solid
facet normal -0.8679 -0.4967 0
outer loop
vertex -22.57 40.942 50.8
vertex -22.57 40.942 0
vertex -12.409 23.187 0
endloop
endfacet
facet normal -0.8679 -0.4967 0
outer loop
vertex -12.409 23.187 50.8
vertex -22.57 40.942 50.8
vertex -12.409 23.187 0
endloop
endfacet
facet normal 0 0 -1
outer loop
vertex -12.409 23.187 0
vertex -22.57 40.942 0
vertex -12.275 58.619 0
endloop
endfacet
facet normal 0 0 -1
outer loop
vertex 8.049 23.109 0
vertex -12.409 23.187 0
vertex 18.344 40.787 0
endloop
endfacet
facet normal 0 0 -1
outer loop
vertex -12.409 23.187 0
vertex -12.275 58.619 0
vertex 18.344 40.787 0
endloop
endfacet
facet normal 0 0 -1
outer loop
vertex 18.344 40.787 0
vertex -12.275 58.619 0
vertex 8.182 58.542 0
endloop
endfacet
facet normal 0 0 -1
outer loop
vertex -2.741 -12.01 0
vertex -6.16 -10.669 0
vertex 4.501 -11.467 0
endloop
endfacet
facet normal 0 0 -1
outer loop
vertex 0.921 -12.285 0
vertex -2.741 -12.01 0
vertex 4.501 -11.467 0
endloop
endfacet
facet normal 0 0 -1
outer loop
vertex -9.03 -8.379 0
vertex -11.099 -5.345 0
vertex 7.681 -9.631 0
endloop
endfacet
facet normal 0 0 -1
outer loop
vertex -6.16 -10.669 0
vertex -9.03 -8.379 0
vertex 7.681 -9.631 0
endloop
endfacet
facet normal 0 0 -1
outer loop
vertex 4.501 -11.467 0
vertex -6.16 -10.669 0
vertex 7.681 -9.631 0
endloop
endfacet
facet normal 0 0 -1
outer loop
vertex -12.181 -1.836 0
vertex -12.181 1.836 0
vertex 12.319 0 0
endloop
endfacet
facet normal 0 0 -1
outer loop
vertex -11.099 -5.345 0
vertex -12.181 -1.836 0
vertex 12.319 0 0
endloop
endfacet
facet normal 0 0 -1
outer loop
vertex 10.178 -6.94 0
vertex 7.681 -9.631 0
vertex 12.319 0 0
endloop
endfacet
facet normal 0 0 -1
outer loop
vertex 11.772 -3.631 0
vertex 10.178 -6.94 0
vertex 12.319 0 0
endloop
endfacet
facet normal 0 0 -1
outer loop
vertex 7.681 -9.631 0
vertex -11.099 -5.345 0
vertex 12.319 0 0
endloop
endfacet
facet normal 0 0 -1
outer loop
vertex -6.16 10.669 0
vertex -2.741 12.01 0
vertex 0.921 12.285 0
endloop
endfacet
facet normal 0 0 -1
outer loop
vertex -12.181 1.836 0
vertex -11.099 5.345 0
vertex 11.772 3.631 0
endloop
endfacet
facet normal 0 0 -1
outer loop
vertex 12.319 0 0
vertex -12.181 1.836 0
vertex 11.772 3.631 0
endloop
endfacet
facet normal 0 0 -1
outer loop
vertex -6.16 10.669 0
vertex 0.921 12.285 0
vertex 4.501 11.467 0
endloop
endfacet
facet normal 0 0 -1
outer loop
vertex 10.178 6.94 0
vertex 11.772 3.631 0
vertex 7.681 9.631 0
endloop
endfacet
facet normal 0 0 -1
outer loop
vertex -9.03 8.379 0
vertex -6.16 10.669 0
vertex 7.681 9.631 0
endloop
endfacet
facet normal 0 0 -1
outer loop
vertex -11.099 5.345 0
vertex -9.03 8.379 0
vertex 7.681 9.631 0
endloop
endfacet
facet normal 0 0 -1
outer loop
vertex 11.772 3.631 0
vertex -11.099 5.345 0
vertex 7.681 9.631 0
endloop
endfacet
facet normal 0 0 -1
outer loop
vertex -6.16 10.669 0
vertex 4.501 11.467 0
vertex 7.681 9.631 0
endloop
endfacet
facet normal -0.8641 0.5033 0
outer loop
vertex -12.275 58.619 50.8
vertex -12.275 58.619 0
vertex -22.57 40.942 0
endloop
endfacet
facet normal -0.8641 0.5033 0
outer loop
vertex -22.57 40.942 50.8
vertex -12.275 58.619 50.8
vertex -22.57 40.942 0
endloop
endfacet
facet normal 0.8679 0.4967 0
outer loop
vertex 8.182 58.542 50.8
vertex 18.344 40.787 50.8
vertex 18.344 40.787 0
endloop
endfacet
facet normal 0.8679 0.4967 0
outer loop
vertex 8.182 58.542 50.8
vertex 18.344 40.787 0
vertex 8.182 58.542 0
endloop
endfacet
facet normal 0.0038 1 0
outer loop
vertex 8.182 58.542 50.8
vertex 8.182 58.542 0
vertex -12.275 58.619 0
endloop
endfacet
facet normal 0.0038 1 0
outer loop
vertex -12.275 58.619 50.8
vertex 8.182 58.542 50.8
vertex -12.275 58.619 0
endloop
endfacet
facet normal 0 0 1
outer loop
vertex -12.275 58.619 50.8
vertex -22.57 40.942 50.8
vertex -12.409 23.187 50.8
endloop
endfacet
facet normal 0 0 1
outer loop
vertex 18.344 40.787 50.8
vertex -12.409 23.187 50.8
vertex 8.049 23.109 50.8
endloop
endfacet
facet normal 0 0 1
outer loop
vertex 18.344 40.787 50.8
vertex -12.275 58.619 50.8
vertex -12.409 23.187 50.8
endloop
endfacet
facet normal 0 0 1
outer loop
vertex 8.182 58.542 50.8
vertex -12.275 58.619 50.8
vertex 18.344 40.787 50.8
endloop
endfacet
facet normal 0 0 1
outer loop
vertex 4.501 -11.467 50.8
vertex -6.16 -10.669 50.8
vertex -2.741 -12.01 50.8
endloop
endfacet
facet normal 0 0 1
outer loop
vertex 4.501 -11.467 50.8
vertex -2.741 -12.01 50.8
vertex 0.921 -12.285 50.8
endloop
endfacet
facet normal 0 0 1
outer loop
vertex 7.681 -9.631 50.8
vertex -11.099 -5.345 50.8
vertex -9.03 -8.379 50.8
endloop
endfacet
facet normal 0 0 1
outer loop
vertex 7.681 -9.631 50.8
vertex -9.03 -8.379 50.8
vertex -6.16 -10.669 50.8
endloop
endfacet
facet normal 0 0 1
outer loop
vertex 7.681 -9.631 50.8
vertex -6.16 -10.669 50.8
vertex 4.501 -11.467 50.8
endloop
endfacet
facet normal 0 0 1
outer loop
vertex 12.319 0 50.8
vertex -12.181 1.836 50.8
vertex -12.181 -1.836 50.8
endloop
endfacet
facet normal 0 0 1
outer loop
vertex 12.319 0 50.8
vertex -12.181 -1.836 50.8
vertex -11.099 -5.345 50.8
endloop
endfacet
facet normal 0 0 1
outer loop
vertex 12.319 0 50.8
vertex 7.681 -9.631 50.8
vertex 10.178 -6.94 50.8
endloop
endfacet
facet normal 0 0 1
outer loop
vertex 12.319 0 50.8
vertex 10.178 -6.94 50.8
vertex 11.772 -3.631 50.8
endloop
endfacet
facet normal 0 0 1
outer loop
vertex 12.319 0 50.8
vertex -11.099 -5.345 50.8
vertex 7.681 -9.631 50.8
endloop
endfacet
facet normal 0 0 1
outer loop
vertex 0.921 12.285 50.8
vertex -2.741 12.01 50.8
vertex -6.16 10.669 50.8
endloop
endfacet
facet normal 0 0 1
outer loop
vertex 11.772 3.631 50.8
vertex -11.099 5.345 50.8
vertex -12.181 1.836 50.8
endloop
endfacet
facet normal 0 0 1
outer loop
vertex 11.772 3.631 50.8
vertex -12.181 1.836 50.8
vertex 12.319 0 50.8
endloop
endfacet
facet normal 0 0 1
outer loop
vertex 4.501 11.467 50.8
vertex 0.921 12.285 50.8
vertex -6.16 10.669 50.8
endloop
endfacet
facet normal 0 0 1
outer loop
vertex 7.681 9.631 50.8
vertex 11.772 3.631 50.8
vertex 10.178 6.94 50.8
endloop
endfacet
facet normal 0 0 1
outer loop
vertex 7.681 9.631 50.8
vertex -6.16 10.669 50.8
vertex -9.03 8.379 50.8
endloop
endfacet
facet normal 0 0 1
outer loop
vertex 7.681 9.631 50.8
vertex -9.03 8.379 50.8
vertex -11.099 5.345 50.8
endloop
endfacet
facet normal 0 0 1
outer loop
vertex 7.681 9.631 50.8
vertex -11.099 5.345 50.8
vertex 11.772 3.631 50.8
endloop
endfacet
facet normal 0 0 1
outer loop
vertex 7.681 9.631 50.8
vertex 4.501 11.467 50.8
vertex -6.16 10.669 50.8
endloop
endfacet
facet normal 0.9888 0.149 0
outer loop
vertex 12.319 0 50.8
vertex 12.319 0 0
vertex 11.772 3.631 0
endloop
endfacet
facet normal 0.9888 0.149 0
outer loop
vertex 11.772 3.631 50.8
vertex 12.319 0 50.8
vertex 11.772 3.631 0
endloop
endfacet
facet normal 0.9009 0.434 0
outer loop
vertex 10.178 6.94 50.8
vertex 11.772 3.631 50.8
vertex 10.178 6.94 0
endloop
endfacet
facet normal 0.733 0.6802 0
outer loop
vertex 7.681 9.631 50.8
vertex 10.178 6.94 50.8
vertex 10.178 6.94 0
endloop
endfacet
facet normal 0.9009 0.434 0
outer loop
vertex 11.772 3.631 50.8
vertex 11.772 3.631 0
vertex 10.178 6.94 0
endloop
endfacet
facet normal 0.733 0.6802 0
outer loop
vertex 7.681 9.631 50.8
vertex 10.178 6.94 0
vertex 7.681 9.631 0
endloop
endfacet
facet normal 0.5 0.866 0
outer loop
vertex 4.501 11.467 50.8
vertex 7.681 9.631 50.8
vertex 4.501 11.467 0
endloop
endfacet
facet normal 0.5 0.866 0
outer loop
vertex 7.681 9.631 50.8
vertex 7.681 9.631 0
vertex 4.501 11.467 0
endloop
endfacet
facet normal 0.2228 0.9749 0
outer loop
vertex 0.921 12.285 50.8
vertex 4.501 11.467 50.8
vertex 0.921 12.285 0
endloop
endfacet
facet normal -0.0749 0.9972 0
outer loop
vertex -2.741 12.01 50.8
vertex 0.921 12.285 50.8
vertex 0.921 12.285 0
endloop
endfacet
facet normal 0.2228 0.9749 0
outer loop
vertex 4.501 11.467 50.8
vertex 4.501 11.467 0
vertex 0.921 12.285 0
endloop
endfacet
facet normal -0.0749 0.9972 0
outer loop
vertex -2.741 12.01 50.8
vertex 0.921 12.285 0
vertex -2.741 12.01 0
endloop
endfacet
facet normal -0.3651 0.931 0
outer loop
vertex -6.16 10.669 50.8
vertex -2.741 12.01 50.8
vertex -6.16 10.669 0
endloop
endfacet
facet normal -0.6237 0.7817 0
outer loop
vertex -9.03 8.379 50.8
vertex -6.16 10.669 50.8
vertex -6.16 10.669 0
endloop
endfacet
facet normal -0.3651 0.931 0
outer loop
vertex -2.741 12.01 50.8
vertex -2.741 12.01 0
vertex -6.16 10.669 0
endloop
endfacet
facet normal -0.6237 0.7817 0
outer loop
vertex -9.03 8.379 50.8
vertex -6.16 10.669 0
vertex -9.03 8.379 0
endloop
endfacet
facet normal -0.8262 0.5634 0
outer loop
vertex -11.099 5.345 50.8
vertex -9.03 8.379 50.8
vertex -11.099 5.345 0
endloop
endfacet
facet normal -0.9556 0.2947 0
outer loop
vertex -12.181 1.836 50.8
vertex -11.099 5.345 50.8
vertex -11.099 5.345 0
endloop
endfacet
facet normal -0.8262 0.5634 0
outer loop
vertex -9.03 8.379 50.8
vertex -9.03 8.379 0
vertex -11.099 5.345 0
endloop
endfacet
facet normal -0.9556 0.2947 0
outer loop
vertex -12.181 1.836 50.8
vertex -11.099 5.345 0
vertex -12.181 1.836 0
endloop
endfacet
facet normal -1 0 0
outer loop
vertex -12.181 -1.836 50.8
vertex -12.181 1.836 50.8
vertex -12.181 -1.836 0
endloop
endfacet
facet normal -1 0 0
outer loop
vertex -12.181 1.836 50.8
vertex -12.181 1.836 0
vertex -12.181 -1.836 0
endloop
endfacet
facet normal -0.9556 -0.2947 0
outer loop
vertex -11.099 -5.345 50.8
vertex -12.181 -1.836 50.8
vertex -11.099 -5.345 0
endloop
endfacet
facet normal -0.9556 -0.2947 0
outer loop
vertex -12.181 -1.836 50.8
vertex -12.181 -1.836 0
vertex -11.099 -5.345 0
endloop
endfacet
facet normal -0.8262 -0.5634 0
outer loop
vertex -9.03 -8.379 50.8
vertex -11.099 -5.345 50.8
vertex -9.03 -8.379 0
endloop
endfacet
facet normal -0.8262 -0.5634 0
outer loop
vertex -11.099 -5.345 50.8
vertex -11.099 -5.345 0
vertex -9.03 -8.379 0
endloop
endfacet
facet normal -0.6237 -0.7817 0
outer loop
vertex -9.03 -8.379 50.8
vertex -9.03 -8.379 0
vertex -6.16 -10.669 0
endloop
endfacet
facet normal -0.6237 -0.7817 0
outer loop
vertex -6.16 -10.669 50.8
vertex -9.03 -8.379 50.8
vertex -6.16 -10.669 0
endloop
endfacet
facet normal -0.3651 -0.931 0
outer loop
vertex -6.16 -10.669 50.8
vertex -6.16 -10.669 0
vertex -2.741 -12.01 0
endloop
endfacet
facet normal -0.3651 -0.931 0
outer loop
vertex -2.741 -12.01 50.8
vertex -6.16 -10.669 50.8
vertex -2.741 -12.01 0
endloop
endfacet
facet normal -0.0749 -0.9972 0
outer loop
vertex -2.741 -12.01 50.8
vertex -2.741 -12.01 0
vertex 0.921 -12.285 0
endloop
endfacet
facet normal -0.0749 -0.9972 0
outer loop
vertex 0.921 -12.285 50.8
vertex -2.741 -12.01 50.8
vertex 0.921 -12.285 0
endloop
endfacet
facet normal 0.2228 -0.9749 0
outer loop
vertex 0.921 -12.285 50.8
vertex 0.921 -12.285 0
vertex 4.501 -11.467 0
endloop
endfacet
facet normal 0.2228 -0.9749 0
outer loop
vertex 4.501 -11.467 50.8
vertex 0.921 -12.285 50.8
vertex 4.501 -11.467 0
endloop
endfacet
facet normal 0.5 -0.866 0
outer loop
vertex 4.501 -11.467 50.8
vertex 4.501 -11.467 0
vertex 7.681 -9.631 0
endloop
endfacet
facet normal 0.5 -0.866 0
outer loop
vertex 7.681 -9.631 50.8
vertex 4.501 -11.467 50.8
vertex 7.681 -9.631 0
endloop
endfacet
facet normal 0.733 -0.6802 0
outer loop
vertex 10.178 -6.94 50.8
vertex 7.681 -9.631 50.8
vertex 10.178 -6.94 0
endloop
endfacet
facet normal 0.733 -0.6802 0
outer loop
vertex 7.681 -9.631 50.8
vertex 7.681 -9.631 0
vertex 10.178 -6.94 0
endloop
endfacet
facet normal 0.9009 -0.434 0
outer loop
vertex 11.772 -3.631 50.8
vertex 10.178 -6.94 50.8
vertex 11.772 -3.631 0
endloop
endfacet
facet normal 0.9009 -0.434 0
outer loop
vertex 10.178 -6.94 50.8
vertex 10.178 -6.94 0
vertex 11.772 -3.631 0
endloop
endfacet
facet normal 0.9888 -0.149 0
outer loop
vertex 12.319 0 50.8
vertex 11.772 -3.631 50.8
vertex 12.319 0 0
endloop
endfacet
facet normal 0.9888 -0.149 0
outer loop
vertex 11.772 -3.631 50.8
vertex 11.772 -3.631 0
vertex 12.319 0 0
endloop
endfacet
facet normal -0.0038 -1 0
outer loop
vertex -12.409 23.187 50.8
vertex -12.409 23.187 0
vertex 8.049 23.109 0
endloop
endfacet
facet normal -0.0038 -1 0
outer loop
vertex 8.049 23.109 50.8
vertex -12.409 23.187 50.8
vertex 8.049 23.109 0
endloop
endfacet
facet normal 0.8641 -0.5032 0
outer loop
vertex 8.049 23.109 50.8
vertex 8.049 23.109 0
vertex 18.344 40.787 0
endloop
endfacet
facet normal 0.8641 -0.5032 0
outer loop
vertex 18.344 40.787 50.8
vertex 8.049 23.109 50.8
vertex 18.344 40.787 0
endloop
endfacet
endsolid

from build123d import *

# Parameters (mm, degrees)
F0_R     = 12.319
F1_DEPTH = 50.8
F3_DEPTH = 50.8


with BuildPart() as f1:
    # F0 (on Top) → F1 (new body)
    with BuildSketch(Plane.XY):
        Circle(F0_R)
    extrude(amount=F1_DEPTH)


with BuildPart() as f3:
    # F2 (on Top) → F3 (new body)
    with BuildSketch(Plane.XY):
        Polygon((-22.570284, 40.941512), (-12.408552, 23.186559), (8.048554, 23.1094), (18.343929, 40.787194), (8.182198, 58.542148), (-12.274909, 58.619307), align=None)
    extrude(amount=F3_DEPTH)


solid = Compound([f1.part, f3.part])
